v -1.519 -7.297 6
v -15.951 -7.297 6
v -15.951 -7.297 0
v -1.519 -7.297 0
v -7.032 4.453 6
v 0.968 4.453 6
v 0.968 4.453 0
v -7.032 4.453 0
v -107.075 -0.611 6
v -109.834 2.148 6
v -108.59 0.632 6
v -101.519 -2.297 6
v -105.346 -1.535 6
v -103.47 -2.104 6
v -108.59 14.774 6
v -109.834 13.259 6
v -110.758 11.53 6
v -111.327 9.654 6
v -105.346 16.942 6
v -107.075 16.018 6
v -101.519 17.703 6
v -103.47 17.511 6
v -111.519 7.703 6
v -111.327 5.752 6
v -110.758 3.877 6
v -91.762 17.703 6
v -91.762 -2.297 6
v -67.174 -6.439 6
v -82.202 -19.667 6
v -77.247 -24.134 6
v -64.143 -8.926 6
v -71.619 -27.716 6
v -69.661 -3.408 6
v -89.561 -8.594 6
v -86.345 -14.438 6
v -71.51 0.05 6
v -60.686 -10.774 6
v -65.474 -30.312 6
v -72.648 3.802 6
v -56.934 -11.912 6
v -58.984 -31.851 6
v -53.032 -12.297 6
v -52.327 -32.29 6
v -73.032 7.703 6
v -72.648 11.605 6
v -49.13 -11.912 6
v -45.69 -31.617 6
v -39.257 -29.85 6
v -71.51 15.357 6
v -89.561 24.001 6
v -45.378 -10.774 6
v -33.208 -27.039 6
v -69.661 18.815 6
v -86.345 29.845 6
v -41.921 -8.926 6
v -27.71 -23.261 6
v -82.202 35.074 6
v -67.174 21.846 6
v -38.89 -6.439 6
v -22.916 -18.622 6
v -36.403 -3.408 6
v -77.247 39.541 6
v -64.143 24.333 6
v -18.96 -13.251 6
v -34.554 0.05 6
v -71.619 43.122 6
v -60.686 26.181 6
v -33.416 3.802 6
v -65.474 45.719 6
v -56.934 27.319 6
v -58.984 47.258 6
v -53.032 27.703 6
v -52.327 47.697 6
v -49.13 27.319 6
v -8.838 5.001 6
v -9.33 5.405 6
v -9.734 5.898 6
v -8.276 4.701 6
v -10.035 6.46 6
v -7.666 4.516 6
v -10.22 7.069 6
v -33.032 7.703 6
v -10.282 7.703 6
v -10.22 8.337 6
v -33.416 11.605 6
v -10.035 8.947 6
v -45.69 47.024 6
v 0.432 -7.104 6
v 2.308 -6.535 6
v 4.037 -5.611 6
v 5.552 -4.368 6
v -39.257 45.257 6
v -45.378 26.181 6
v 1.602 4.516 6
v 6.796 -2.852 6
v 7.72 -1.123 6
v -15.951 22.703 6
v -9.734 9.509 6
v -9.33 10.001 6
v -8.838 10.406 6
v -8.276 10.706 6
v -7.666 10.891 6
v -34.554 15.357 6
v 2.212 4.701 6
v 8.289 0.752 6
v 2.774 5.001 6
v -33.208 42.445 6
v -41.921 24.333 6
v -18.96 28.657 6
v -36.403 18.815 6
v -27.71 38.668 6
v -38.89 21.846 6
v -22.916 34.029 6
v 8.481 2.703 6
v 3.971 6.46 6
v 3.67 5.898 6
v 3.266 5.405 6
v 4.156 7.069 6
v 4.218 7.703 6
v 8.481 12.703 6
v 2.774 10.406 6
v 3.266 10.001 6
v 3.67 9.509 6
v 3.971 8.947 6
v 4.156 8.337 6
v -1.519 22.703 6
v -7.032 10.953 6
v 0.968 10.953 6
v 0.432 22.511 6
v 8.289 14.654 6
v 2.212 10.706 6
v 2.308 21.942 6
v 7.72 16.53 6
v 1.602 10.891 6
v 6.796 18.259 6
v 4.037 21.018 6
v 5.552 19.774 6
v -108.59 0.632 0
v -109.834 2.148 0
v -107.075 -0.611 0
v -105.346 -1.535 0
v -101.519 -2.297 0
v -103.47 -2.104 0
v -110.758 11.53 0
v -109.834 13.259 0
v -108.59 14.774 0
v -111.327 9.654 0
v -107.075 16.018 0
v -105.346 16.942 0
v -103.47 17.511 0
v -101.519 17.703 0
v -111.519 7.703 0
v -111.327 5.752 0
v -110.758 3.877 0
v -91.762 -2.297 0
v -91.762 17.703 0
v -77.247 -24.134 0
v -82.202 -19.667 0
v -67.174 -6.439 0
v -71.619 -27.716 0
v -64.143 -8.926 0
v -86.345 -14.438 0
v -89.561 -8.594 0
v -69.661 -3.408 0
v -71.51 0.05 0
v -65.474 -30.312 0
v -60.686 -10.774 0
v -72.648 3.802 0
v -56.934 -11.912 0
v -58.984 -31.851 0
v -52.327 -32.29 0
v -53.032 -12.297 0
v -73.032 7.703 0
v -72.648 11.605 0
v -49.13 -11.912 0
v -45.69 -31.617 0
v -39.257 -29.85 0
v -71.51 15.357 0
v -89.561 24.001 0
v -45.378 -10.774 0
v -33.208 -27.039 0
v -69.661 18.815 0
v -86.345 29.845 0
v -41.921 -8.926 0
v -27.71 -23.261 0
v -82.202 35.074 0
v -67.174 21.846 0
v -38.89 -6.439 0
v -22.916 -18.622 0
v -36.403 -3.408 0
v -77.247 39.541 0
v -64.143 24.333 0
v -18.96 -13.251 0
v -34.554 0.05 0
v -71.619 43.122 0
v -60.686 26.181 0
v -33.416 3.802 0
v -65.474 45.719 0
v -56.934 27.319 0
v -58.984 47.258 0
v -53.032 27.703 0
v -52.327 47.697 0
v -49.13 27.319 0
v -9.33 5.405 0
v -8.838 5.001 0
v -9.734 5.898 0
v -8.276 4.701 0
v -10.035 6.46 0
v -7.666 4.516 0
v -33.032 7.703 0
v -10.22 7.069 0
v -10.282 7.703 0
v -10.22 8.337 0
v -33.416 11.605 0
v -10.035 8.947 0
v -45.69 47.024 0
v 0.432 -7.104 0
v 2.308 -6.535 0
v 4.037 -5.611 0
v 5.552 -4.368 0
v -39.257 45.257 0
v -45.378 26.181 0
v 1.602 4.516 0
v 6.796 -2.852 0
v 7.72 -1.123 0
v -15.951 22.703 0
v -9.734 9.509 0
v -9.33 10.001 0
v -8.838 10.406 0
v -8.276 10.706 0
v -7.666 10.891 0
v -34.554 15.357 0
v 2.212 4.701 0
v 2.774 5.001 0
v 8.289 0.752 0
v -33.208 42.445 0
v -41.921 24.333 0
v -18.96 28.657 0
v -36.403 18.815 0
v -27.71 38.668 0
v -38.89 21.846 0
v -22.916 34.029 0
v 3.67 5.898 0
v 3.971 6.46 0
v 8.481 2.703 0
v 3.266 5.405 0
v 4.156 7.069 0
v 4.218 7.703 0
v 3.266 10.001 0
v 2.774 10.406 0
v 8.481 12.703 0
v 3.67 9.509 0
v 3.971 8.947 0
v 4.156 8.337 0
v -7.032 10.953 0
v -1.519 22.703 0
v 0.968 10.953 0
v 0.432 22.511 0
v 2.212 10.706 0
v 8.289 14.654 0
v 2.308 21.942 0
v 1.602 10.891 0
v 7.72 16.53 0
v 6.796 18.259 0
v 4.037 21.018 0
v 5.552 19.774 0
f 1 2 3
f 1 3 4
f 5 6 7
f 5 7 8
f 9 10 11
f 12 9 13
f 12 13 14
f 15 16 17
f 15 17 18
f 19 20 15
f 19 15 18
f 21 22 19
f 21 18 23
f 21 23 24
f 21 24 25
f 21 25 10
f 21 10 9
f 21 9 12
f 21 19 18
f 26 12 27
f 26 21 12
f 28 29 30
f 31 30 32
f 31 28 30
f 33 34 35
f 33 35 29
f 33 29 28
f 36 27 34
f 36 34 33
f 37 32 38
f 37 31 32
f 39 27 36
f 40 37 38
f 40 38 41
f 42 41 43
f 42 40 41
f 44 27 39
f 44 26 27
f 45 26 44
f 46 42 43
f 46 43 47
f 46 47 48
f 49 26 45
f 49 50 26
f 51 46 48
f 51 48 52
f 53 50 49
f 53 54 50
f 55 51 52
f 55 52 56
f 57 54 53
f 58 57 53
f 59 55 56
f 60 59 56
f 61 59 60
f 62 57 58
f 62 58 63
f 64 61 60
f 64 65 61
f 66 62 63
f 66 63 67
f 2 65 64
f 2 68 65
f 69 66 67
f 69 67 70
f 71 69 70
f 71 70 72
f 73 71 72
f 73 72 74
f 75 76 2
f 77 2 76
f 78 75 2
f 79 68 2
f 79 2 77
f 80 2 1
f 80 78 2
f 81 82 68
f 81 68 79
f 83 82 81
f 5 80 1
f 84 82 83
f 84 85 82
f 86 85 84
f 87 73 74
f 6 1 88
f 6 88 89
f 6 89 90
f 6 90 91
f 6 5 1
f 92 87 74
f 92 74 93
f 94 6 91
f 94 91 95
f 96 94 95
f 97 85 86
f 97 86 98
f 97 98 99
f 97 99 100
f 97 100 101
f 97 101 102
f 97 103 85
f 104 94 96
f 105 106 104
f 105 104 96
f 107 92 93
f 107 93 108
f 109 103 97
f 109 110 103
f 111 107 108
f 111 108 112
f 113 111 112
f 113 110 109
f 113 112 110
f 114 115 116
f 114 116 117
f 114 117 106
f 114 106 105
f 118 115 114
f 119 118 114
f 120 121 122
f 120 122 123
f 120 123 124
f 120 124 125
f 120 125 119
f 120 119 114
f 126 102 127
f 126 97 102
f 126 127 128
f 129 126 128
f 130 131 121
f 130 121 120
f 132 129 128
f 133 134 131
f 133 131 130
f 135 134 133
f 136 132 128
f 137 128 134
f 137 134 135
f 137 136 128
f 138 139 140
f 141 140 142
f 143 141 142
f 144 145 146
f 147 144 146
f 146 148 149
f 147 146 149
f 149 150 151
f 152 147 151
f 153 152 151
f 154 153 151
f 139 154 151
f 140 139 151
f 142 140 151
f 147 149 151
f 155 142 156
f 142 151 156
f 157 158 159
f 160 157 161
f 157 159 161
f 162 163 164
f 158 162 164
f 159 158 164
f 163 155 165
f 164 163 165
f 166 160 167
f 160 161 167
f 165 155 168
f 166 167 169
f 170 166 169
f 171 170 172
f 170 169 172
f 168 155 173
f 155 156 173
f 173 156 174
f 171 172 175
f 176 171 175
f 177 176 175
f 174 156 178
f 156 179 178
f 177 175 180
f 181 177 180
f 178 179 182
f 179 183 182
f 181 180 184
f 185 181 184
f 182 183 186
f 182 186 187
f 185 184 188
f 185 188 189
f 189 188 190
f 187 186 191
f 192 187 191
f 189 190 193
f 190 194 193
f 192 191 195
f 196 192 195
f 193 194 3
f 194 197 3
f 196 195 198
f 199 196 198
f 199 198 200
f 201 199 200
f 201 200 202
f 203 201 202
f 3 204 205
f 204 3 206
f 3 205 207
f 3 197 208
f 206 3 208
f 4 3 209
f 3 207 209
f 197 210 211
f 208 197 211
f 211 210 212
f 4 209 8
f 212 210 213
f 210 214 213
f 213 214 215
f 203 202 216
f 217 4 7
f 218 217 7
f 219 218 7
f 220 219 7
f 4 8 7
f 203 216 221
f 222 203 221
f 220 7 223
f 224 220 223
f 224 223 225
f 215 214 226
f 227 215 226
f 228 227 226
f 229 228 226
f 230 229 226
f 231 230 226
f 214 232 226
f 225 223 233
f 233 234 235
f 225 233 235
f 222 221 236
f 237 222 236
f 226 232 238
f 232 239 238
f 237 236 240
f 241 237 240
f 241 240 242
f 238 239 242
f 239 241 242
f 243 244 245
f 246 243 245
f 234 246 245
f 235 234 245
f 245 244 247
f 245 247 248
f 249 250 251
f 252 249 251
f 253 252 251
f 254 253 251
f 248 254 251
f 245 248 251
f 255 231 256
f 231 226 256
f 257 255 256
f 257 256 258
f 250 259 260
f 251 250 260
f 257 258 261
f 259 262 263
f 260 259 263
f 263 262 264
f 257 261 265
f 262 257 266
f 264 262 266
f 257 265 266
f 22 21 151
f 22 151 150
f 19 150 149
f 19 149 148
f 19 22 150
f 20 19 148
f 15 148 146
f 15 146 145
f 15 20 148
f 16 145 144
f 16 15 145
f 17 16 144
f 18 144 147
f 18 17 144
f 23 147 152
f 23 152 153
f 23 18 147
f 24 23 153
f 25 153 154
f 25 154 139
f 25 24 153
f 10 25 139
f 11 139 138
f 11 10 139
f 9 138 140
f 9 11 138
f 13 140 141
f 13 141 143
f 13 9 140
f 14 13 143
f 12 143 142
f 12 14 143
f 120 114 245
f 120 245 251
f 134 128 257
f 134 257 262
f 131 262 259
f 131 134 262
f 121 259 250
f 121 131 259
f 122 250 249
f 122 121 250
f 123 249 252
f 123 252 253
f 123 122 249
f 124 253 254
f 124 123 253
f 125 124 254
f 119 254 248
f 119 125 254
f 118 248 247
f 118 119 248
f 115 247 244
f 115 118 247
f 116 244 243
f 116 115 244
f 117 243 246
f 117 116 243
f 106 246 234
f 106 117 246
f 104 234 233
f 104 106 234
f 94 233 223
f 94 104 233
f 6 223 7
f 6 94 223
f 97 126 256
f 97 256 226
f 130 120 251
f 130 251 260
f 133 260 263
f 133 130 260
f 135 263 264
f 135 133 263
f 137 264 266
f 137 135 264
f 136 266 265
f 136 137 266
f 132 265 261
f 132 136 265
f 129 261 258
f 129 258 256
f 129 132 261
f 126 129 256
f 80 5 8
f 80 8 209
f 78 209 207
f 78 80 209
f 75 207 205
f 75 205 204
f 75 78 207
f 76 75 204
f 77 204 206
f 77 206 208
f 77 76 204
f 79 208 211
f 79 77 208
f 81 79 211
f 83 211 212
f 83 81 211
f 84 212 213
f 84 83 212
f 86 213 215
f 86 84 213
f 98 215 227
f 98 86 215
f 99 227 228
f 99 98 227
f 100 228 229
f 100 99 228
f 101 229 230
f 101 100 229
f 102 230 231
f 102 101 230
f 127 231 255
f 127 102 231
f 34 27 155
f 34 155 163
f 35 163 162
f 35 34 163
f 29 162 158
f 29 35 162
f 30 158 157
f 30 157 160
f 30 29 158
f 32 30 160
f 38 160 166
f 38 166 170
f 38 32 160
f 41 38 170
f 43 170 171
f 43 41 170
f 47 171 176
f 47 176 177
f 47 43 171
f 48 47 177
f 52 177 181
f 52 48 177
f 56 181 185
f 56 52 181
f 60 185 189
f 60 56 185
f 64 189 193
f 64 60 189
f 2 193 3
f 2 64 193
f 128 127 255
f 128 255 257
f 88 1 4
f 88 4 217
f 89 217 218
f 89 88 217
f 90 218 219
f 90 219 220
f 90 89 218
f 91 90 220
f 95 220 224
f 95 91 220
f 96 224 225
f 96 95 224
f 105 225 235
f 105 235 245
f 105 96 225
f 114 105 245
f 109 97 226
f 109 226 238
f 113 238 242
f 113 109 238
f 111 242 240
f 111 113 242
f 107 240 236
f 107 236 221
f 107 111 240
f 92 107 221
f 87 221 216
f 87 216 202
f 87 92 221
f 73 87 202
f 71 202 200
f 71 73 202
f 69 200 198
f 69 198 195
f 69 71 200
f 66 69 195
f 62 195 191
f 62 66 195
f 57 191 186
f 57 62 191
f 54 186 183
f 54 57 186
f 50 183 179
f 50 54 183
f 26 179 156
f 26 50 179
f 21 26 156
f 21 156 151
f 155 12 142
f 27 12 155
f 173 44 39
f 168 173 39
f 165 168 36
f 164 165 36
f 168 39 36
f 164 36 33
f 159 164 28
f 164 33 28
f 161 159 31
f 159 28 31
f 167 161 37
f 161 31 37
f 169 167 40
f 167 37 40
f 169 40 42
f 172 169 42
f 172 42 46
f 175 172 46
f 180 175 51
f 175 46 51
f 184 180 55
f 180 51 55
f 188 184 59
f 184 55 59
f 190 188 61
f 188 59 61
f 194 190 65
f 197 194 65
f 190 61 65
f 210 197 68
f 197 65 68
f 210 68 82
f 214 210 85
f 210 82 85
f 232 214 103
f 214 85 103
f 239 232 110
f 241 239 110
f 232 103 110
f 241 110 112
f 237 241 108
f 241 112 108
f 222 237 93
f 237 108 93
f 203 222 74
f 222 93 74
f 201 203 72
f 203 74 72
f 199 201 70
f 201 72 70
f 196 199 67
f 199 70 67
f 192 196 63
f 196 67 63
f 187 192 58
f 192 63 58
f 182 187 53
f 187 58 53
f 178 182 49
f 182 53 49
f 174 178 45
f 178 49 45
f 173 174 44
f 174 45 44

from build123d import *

# Parameters (mm, degrees)
SKETCH1_R           = 20
BOSS_EXTRUDE1_DEPTH = 6


with BuildPart() as part:
    # Sketch1 → Boss-Extrude1 (new body)
    with BuildSketch(Plane.XY.offset(6)):
        with BuildLine():
            Line((-91.761844853, 17.703382647), (-101.518898091, 17.703382647))
            ThreePointArc((-101.518898091, 17.703382647), (-111.518898091, 7.703382647), (-101.518898091, -2.296617353))
            Line((-101.518898091, -2.296617353), (-91.761844853, -2.296617353))
            ThreePointArc((-91.761844853, -2.296617353), (-55.664437873, -32.209902495), (-15.951018956, -7.296617353))
            Line((-15.951018956, -7.296617353), (-1.518898091, -7.296617353))
            ThreePointArc((-1.518898091, -7.296617353), (5.552169721, -4.367685165), (8.481101909, 2.703382647))
            Line((8.481101909, 2.703382647), (8.481101909, 12.703382647))
            ThreePointArc((8.481101909, 12.703382647), (5.552169721, 19.774450459), (-1.518898091, 22.703382647))
            Line((-1.518898091, 22.703382647), (-15.951018956, 22.703382647))
            ThreePointArc((-15.951018956, 22.703382647), (-55.664437873, 47.616667789), (-91.761844853, 17.703382647))
        make_face()
        with Locations(Location((-53.032011391, 7.703382647, 0), (0, 0, 180))):
            Circle(SKETCH1_R, mode=Mode.SUBTRACT)
        with BuildLine():
            Line((-7.032011391, 10.953382647), (0.967988609, 10.953382647))
            ThreePointArc((0.967988609, 10.953382647), (4.217988609, 7.703382647), (0.967988609, 4.453382647))
            Line((0.967988609, 4.453382647), (-7.032011391, 4.453382647))
            ThreePointArc((-7.032011391, 4.453382647), (-10.282011391, 7.703382647), (-7.032011391, 10.953382647))
        make_face(mode=Mode.SUBTRACT)
    extrude(amount=-BOSS_EXTRUDE1_DEPTH)


solid = part.part
